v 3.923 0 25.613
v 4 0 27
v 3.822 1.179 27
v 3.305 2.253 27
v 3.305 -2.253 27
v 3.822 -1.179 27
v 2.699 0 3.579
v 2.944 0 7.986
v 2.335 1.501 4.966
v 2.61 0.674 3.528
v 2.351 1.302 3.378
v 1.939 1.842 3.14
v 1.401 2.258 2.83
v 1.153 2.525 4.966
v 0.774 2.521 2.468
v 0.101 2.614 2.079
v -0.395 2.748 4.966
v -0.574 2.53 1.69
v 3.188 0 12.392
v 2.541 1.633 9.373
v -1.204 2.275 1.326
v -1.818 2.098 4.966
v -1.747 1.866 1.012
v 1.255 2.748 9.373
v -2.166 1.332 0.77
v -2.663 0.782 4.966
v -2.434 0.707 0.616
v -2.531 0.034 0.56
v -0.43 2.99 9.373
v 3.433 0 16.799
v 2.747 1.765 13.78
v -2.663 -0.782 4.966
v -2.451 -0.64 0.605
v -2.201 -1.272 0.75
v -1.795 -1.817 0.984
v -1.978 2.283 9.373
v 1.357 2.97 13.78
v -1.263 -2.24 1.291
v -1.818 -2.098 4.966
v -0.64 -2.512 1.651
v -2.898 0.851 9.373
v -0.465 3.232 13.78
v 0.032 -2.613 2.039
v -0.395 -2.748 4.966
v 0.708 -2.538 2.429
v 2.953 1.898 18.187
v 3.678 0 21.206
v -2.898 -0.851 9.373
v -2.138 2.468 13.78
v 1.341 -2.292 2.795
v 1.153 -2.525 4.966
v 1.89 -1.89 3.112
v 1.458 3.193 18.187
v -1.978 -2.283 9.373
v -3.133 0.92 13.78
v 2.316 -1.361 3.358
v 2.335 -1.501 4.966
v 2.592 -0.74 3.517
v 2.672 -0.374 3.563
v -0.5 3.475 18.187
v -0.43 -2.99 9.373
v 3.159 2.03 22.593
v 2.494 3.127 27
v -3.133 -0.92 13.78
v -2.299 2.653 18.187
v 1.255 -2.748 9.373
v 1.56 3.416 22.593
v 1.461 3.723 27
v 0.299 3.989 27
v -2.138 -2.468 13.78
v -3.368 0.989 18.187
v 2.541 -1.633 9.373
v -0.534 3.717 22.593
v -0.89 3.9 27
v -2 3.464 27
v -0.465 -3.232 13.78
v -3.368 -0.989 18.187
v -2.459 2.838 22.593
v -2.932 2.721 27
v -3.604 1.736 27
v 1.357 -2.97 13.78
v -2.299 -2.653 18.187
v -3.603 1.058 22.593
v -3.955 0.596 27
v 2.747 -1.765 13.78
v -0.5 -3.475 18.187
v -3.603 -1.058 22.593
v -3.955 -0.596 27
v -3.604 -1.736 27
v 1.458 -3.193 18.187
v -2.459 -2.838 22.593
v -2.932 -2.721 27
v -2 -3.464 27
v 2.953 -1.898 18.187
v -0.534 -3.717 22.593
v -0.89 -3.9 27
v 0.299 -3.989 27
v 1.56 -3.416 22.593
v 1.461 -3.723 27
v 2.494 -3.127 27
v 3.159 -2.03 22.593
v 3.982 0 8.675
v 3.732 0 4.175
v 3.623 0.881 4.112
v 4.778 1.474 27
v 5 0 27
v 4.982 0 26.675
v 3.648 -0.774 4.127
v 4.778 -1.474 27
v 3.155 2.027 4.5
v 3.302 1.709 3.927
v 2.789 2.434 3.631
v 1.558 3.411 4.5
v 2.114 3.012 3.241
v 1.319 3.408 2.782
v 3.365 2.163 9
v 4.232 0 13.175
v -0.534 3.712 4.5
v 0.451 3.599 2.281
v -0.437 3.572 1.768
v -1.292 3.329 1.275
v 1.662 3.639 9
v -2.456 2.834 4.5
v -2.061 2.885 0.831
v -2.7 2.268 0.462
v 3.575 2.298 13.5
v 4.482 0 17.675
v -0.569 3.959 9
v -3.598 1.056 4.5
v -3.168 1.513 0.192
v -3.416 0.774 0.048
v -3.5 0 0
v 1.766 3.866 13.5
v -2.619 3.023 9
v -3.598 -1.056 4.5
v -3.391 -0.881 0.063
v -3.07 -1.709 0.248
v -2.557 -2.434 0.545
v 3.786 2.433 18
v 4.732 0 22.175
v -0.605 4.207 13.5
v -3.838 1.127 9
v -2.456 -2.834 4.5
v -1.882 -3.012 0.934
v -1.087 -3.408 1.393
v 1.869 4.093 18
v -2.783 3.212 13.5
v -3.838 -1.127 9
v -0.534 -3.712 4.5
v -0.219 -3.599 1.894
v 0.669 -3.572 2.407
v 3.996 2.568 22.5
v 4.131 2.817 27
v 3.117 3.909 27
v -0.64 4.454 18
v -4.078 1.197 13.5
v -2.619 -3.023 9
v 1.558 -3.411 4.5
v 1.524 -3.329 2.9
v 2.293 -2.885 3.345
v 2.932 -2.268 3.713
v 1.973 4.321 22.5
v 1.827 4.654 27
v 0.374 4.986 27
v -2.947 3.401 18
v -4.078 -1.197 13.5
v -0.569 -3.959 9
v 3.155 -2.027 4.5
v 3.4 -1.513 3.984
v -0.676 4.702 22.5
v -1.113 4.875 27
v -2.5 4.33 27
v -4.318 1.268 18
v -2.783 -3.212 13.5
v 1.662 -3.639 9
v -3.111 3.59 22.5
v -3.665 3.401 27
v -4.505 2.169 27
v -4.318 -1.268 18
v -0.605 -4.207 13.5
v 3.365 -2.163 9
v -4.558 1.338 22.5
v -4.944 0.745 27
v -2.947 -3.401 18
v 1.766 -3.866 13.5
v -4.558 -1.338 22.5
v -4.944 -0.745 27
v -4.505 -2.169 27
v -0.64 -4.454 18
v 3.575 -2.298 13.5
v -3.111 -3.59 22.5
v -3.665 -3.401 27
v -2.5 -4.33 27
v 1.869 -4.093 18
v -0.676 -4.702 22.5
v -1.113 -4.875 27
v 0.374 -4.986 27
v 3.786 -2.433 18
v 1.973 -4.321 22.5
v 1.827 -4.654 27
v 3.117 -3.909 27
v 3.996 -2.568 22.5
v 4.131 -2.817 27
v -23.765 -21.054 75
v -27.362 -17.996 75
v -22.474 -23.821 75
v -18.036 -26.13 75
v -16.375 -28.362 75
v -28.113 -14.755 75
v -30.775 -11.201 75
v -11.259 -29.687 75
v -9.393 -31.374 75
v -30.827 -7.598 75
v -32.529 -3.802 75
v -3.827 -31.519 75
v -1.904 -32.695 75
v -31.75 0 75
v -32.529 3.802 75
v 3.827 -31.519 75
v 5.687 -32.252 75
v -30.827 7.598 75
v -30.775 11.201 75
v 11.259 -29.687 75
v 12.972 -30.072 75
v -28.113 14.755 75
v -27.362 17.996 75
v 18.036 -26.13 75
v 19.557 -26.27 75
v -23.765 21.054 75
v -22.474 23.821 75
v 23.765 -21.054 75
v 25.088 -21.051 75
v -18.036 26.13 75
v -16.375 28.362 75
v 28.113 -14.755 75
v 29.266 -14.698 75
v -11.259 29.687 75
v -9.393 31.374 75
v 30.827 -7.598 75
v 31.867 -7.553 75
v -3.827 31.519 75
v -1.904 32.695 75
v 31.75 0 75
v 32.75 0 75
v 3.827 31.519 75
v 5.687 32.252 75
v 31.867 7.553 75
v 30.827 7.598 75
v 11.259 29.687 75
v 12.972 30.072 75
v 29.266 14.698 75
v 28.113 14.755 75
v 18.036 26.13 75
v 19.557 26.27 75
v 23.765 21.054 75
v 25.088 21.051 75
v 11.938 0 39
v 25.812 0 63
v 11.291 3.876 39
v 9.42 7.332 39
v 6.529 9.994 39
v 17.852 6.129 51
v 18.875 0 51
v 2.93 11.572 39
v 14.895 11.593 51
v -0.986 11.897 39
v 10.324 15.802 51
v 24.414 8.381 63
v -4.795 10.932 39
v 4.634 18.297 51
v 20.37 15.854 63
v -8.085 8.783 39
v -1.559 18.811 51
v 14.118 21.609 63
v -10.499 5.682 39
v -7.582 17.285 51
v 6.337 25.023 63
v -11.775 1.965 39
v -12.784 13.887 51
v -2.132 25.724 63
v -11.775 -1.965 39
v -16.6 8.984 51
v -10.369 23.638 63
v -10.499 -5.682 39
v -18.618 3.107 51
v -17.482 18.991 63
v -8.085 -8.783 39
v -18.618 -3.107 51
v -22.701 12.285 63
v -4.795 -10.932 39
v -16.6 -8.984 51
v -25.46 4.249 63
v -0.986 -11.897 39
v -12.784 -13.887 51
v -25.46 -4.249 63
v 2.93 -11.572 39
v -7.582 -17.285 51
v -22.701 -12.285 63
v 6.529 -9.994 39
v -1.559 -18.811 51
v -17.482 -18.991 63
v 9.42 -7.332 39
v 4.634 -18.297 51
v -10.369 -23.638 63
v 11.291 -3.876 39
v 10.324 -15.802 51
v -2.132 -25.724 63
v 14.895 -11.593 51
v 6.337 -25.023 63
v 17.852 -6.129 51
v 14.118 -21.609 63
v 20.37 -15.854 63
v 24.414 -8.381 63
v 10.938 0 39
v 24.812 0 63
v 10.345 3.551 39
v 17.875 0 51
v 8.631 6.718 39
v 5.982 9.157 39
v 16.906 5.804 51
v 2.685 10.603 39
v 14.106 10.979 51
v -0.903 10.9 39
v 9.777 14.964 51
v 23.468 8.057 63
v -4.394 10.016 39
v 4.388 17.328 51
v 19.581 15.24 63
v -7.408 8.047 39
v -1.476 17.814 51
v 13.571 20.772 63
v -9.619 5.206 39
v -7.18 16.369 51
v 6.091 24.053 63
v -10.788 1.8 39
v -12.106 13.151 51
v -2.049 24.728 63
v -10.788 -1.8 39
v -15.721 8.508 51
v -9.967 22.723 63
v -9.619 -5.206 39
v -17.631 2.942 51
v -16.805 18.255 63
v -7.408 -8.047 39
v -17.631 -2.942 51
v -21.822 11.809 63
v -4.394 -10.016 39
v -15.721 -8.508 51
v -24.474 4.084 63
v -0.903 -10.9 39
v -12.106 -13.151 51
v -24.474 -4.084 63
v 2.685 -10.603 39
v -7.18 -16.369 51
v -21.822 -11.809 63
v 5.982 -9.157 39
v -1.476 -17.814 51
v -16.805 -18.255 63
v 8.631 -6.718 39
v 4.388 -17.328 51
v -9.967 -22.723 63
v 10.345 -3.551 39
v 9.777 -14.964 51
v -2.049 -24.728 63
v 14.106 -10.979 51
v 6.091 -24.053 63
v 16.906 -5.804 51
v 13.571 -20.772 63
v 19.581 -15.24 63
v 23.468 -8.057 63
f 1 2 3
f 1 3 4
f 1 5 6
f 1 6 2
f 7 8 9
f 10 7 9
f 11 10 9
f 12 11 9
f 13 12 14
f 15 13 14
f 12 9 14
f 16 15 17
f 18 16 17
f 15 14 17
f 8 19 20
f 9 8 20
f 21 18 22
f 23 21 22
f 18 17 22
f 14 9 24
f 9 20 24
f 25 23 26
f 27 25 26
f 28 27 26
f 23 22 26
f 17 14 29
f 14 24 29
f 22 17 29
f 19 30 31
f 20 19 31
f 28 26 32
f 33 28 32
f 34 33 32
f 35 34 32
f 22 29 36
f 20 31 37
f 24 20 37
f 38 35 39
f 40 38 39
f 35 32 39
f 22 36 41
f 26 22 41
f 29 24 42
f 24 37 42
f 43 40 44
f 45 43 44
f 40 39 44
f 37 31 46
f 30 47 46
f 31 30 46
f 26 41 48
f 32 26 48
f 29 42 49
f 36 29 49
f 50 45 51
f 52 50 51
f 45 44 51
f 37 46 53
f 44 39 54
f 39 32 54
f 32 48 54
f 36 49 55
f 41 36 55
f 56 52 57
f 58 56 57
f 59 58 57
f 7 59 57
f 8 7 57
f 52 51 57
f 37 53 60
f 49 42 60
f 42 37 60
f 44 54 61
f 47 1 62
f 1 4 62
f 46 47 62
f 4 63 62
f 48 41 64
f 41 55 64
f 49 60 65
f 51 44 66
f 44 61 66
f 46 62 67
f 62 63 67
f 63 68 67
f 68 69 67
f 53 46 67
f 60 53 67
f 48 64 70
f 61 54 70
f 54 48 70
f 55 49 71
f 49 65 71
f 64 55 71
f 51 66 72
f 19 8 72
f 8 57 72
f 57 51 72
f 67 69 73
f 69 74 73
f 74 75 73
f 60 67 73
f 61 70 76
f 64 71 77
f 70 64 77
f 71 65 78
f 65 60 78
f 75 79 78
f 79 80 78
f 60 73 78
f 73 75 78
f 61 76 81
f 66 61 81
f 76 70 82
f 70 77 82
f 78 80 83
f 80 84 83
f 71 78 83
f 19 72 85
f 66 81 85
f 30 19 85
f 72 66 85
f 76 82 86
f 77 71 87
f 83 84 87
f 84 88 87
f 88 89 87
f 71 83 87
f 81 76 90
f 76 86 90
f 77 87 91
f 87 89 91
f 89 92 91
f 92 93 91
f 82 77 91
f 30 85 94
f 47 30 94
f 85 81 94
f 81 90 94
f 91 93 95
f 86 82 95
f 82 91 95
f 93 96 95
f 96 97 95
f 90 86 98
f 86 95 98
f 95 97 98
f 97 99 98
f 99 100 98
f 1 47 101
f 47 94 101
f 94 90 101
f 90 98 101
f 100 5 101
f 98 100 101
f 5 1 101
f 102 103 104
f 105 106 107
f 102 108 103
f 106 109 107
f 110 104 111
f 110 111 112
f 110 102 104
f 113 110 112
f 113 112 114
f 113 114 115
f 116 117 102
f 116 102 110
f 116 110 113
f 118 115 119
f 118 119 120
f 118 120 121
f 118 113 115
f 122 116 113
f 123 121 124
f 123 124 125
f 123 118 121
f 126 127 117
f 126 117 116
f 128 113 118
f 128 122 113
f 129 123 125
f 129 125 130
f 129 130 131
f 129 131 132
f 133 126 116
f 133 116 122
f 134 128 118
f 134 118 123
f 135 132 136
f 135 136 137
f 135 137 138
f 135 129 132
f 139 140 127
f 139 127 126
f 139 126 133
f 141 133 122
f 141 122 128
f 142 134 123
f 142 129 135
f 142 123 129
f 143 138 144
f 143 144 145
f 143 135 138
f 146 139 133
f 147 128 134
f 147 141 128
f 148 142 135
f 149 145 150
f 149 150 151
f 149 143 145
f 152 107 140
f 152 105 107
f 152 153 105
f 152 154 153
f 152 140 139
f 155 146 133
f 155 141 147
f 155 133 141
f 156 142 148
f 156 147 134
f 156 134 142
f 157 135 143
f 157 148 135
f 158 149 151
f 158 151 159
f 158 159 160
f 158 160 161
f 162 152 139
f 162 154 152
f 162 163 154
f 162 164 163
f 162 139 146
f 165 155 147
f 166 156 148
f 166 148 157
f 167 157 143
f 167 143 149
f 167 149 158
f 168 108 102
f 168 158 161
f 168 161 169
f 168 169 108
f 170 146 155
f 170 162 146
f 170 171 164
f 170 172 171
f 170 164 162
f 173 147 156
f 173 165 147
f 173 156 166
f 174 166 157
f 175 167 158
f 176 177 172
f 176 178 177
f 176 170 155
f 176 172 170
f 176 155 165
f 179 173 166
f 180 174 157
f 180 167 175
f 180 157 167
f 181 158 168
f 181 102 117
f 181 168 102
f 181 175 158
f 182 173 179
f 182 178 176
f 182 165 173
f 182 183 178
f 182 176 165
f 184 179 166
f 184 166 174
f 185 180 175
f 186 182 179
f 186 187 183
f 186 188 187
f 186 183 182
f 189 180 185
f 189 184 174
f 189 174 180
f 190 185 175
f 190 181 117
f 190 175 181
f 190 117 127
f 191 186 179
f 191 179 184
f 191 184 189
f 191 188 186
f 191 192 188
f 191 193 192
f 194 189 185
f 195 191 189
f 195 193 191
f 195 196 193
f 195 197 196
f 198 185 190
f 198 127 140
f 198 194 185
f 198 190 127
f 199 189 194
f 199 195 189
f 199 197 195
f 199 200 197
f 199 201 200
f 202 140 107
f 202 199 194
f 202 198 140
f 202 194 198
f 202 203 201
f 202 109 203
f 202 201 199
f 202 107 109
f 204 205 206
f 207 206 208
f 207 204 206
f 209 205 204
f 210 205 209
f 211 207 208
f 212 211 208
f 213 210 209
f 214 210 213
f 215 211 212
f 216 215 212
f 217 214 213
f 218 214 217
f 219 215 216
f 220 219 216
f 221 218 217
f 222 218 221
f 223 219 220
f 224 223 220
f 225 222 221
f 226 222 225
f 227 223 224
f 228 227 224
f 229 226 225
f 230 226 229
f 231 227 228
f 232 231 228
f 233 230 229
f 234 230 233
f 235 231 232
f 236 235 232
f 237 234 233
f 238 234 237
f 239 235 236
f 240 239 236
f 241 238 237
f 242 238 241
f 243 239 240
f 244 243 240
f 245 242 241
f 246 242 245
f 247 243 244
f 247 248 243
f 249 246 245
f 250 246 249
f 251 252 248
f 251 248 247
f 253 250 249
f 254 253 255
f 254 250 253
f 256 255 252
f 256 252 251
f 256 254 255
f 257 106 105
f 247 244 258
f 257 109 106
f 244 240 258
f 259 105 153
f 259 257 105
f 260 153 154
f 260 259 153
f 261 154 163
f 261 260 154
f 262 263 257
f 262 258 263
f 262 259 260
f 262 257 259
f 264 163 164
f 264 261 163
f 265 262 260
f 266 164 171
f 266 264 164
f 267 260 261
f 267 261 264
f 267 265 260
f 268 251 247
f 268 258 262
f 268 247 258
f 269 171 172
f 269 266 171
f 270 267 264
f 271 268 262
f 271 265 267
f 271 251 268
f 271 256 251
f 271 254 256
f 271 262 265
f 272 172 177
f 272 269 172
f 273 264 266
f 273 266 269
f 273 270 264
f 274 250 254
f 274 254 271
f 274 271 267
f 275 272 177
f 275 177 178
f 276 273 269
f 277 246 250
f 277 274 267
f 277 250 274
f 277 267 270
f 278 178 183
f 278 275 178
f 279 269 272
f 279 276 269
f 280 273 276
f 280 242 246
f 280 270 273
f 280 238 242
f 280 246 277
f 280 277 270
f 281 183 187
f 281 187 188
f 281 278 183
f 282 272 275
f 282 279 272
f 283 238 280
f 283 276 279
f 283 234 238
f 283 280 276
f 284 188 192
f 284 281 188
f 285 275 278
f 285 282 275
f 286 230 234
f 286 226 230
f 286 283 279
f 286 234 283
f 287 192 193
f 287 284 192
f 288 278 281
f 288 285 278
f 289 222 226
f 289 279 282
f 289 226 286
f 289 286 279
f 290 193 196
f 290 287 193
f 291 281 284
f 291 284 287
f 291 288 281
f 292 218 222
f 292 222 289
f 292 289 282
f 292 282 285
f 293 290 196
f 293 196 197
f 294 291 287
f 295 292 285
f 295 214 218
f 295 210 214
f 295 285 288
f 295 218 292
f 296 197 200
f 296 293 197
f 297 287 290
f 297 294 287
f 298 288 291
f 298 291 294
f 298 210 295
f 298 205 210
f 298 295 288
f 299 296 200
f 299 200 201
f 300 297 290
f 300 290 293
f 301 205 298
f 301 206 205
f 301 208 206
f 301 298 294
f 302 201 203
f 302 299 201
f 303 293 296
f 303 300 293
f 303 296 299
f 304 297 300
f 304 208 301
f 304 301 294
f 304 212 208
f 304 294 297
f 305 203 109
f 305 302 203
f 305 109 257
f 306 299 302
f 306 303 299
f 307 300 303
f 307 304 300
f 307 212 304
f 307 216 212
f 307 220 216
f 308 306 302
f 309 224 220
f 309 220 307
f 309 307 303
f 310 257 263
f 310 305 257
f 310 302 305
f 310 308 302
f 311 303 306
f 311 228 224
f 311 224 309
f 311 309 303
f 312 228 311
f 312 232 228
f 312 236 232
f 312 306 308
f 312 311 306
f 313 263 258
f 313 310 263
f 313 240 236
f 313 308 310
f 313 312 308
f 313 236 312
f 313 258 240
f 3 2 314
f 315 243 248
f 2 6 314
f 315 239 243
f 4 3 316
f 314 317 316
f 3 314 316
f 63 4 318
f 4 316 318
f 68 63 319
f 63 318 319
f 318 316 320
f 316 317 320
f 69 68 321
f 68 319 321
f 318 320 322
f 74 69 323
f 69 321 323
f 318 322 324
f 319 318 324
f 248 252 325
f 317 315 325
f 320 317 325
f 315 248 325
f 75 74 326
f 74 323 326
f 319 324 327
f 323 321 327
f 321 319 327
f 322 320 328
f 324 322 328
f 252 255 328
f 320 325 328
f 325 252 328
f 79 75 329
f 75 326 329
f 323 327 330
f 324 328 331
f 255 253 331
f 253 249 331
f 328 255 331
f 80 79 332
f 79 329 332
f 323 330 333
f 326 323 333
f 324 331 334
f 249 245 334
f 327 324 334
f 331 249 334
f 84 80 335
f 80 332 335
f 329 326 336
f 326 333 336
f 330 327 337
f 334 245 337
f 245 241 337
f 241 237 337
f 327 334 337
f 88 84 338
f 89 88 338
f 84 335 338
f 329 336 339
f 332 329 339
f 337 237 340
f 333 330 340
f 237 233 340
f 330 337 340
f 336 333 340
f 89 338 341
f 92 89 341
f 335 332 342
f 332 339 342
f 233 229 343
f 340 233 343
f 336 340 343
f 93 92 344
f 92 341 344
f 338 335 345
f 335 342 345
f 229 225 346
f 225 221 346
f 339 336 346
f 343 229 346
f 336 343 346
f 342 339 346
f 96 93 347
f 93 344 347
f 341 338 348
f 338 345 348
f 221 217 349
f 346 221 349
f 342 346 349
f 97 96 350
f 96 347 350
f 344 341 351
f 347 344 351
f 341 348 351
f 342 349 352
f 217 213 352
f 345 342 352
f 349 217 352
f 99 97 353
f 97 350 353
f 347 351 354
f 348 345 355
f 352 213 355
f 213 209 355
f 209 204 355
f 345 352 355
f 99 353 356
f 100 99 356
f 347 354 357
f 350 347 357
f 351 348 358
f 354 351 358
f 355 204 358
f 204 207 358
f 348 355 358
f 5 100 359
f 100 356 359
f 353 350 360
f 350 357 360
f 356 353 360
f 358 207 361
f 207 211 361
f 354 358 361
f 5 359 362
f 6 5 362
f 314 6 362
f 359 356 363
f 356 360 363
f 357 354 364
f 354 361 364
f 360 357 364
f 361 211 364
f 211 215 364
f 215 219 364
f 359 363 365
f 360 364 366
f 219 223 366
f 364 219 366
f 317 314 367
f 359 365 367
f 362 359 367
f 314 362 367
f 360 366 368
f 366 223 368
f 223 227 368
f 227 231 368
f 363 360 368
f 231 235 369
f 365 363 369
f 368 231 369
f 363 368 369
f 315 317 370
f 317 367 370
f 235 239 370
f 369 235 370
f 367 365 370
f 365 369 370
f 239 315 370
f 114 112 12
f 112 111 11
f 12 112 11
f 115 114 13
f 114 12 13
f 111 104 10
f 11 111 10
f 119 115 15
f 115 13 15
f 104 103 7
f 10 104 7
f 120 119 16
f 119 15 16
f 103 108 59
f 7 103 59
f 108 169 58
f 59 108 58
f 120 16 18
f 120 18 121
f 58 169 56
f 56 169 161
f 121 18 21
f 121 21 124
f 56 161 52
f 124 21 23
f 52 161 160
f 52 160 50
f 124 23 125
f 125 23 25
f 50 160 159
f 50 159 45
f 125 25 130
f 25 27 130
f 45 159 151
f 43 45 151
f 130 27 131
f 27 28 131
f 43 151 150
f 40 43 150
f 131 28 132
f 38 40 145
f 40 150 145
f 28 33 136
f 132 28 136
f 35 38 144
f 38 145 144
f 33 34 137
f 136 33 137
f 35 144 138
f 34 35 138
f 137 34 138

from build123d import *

# Parameters (mm, degrees)
F0_R     = 3.5
F2_R     = 5
F4_R     = 2.5
F5_R     = 4
F8_DEPTH = 12.5
F12_R    = 5
F13_R    = 32.75
F9_R     = 4
F11_R    = 31.75


with BuildPart() as f3:
    # F0 (on Top) → F3 section 0
    with BuildSketch(Plane.XY):
        Circle(F0_R)
    # F2 (on offset) → F3 section 1
    with BuildSketch(Plane.XY.offset(27)):
        Circle(F2_R)
    loft()

    # F4 (on Top) → F6 section 0
    with BuildSketch(Plane.XY):
        Circle(F4_R)
    # F5 (on offset) → F6 section 1
    with BuildSketch(Plane.XY.offset(27)):
        Circle(F5_R)
    loft(mode=Mode.SUBTRACT)

    # F7 (on Front) → F8 (cut, symmetric)
    with BuildSketch(Plane.XZ):
        Polygon((12.088457, 9), (-3.5, 0), (12.088457, 0), align=None)
    extrude(amount=F8_DEPTH, both=True, mode=Mode.SUBTRACT)

    # F12 (on offset) → F14 section 0
    with BuildSketch(Plane.XY.offset(27)):
        Circle(F12_R)
    # F13 (on offset) → F14 section 1
    with BuildSketch(Plane.XY.offset(75)):
        Circle(F13_R)
    loft()

    # F9 (on offset) → F15 section 0
    with BuildSketch(Plane.XY.offset(27)):
        Circle(F9_R)
    # F11 (on offset) → F15 section 1
    with BuildSketch(Plane.XY.offset(75)):
        Circle(F11_R)
    loft(mode=Mode.SUBTRACT)


solid = f3.part
